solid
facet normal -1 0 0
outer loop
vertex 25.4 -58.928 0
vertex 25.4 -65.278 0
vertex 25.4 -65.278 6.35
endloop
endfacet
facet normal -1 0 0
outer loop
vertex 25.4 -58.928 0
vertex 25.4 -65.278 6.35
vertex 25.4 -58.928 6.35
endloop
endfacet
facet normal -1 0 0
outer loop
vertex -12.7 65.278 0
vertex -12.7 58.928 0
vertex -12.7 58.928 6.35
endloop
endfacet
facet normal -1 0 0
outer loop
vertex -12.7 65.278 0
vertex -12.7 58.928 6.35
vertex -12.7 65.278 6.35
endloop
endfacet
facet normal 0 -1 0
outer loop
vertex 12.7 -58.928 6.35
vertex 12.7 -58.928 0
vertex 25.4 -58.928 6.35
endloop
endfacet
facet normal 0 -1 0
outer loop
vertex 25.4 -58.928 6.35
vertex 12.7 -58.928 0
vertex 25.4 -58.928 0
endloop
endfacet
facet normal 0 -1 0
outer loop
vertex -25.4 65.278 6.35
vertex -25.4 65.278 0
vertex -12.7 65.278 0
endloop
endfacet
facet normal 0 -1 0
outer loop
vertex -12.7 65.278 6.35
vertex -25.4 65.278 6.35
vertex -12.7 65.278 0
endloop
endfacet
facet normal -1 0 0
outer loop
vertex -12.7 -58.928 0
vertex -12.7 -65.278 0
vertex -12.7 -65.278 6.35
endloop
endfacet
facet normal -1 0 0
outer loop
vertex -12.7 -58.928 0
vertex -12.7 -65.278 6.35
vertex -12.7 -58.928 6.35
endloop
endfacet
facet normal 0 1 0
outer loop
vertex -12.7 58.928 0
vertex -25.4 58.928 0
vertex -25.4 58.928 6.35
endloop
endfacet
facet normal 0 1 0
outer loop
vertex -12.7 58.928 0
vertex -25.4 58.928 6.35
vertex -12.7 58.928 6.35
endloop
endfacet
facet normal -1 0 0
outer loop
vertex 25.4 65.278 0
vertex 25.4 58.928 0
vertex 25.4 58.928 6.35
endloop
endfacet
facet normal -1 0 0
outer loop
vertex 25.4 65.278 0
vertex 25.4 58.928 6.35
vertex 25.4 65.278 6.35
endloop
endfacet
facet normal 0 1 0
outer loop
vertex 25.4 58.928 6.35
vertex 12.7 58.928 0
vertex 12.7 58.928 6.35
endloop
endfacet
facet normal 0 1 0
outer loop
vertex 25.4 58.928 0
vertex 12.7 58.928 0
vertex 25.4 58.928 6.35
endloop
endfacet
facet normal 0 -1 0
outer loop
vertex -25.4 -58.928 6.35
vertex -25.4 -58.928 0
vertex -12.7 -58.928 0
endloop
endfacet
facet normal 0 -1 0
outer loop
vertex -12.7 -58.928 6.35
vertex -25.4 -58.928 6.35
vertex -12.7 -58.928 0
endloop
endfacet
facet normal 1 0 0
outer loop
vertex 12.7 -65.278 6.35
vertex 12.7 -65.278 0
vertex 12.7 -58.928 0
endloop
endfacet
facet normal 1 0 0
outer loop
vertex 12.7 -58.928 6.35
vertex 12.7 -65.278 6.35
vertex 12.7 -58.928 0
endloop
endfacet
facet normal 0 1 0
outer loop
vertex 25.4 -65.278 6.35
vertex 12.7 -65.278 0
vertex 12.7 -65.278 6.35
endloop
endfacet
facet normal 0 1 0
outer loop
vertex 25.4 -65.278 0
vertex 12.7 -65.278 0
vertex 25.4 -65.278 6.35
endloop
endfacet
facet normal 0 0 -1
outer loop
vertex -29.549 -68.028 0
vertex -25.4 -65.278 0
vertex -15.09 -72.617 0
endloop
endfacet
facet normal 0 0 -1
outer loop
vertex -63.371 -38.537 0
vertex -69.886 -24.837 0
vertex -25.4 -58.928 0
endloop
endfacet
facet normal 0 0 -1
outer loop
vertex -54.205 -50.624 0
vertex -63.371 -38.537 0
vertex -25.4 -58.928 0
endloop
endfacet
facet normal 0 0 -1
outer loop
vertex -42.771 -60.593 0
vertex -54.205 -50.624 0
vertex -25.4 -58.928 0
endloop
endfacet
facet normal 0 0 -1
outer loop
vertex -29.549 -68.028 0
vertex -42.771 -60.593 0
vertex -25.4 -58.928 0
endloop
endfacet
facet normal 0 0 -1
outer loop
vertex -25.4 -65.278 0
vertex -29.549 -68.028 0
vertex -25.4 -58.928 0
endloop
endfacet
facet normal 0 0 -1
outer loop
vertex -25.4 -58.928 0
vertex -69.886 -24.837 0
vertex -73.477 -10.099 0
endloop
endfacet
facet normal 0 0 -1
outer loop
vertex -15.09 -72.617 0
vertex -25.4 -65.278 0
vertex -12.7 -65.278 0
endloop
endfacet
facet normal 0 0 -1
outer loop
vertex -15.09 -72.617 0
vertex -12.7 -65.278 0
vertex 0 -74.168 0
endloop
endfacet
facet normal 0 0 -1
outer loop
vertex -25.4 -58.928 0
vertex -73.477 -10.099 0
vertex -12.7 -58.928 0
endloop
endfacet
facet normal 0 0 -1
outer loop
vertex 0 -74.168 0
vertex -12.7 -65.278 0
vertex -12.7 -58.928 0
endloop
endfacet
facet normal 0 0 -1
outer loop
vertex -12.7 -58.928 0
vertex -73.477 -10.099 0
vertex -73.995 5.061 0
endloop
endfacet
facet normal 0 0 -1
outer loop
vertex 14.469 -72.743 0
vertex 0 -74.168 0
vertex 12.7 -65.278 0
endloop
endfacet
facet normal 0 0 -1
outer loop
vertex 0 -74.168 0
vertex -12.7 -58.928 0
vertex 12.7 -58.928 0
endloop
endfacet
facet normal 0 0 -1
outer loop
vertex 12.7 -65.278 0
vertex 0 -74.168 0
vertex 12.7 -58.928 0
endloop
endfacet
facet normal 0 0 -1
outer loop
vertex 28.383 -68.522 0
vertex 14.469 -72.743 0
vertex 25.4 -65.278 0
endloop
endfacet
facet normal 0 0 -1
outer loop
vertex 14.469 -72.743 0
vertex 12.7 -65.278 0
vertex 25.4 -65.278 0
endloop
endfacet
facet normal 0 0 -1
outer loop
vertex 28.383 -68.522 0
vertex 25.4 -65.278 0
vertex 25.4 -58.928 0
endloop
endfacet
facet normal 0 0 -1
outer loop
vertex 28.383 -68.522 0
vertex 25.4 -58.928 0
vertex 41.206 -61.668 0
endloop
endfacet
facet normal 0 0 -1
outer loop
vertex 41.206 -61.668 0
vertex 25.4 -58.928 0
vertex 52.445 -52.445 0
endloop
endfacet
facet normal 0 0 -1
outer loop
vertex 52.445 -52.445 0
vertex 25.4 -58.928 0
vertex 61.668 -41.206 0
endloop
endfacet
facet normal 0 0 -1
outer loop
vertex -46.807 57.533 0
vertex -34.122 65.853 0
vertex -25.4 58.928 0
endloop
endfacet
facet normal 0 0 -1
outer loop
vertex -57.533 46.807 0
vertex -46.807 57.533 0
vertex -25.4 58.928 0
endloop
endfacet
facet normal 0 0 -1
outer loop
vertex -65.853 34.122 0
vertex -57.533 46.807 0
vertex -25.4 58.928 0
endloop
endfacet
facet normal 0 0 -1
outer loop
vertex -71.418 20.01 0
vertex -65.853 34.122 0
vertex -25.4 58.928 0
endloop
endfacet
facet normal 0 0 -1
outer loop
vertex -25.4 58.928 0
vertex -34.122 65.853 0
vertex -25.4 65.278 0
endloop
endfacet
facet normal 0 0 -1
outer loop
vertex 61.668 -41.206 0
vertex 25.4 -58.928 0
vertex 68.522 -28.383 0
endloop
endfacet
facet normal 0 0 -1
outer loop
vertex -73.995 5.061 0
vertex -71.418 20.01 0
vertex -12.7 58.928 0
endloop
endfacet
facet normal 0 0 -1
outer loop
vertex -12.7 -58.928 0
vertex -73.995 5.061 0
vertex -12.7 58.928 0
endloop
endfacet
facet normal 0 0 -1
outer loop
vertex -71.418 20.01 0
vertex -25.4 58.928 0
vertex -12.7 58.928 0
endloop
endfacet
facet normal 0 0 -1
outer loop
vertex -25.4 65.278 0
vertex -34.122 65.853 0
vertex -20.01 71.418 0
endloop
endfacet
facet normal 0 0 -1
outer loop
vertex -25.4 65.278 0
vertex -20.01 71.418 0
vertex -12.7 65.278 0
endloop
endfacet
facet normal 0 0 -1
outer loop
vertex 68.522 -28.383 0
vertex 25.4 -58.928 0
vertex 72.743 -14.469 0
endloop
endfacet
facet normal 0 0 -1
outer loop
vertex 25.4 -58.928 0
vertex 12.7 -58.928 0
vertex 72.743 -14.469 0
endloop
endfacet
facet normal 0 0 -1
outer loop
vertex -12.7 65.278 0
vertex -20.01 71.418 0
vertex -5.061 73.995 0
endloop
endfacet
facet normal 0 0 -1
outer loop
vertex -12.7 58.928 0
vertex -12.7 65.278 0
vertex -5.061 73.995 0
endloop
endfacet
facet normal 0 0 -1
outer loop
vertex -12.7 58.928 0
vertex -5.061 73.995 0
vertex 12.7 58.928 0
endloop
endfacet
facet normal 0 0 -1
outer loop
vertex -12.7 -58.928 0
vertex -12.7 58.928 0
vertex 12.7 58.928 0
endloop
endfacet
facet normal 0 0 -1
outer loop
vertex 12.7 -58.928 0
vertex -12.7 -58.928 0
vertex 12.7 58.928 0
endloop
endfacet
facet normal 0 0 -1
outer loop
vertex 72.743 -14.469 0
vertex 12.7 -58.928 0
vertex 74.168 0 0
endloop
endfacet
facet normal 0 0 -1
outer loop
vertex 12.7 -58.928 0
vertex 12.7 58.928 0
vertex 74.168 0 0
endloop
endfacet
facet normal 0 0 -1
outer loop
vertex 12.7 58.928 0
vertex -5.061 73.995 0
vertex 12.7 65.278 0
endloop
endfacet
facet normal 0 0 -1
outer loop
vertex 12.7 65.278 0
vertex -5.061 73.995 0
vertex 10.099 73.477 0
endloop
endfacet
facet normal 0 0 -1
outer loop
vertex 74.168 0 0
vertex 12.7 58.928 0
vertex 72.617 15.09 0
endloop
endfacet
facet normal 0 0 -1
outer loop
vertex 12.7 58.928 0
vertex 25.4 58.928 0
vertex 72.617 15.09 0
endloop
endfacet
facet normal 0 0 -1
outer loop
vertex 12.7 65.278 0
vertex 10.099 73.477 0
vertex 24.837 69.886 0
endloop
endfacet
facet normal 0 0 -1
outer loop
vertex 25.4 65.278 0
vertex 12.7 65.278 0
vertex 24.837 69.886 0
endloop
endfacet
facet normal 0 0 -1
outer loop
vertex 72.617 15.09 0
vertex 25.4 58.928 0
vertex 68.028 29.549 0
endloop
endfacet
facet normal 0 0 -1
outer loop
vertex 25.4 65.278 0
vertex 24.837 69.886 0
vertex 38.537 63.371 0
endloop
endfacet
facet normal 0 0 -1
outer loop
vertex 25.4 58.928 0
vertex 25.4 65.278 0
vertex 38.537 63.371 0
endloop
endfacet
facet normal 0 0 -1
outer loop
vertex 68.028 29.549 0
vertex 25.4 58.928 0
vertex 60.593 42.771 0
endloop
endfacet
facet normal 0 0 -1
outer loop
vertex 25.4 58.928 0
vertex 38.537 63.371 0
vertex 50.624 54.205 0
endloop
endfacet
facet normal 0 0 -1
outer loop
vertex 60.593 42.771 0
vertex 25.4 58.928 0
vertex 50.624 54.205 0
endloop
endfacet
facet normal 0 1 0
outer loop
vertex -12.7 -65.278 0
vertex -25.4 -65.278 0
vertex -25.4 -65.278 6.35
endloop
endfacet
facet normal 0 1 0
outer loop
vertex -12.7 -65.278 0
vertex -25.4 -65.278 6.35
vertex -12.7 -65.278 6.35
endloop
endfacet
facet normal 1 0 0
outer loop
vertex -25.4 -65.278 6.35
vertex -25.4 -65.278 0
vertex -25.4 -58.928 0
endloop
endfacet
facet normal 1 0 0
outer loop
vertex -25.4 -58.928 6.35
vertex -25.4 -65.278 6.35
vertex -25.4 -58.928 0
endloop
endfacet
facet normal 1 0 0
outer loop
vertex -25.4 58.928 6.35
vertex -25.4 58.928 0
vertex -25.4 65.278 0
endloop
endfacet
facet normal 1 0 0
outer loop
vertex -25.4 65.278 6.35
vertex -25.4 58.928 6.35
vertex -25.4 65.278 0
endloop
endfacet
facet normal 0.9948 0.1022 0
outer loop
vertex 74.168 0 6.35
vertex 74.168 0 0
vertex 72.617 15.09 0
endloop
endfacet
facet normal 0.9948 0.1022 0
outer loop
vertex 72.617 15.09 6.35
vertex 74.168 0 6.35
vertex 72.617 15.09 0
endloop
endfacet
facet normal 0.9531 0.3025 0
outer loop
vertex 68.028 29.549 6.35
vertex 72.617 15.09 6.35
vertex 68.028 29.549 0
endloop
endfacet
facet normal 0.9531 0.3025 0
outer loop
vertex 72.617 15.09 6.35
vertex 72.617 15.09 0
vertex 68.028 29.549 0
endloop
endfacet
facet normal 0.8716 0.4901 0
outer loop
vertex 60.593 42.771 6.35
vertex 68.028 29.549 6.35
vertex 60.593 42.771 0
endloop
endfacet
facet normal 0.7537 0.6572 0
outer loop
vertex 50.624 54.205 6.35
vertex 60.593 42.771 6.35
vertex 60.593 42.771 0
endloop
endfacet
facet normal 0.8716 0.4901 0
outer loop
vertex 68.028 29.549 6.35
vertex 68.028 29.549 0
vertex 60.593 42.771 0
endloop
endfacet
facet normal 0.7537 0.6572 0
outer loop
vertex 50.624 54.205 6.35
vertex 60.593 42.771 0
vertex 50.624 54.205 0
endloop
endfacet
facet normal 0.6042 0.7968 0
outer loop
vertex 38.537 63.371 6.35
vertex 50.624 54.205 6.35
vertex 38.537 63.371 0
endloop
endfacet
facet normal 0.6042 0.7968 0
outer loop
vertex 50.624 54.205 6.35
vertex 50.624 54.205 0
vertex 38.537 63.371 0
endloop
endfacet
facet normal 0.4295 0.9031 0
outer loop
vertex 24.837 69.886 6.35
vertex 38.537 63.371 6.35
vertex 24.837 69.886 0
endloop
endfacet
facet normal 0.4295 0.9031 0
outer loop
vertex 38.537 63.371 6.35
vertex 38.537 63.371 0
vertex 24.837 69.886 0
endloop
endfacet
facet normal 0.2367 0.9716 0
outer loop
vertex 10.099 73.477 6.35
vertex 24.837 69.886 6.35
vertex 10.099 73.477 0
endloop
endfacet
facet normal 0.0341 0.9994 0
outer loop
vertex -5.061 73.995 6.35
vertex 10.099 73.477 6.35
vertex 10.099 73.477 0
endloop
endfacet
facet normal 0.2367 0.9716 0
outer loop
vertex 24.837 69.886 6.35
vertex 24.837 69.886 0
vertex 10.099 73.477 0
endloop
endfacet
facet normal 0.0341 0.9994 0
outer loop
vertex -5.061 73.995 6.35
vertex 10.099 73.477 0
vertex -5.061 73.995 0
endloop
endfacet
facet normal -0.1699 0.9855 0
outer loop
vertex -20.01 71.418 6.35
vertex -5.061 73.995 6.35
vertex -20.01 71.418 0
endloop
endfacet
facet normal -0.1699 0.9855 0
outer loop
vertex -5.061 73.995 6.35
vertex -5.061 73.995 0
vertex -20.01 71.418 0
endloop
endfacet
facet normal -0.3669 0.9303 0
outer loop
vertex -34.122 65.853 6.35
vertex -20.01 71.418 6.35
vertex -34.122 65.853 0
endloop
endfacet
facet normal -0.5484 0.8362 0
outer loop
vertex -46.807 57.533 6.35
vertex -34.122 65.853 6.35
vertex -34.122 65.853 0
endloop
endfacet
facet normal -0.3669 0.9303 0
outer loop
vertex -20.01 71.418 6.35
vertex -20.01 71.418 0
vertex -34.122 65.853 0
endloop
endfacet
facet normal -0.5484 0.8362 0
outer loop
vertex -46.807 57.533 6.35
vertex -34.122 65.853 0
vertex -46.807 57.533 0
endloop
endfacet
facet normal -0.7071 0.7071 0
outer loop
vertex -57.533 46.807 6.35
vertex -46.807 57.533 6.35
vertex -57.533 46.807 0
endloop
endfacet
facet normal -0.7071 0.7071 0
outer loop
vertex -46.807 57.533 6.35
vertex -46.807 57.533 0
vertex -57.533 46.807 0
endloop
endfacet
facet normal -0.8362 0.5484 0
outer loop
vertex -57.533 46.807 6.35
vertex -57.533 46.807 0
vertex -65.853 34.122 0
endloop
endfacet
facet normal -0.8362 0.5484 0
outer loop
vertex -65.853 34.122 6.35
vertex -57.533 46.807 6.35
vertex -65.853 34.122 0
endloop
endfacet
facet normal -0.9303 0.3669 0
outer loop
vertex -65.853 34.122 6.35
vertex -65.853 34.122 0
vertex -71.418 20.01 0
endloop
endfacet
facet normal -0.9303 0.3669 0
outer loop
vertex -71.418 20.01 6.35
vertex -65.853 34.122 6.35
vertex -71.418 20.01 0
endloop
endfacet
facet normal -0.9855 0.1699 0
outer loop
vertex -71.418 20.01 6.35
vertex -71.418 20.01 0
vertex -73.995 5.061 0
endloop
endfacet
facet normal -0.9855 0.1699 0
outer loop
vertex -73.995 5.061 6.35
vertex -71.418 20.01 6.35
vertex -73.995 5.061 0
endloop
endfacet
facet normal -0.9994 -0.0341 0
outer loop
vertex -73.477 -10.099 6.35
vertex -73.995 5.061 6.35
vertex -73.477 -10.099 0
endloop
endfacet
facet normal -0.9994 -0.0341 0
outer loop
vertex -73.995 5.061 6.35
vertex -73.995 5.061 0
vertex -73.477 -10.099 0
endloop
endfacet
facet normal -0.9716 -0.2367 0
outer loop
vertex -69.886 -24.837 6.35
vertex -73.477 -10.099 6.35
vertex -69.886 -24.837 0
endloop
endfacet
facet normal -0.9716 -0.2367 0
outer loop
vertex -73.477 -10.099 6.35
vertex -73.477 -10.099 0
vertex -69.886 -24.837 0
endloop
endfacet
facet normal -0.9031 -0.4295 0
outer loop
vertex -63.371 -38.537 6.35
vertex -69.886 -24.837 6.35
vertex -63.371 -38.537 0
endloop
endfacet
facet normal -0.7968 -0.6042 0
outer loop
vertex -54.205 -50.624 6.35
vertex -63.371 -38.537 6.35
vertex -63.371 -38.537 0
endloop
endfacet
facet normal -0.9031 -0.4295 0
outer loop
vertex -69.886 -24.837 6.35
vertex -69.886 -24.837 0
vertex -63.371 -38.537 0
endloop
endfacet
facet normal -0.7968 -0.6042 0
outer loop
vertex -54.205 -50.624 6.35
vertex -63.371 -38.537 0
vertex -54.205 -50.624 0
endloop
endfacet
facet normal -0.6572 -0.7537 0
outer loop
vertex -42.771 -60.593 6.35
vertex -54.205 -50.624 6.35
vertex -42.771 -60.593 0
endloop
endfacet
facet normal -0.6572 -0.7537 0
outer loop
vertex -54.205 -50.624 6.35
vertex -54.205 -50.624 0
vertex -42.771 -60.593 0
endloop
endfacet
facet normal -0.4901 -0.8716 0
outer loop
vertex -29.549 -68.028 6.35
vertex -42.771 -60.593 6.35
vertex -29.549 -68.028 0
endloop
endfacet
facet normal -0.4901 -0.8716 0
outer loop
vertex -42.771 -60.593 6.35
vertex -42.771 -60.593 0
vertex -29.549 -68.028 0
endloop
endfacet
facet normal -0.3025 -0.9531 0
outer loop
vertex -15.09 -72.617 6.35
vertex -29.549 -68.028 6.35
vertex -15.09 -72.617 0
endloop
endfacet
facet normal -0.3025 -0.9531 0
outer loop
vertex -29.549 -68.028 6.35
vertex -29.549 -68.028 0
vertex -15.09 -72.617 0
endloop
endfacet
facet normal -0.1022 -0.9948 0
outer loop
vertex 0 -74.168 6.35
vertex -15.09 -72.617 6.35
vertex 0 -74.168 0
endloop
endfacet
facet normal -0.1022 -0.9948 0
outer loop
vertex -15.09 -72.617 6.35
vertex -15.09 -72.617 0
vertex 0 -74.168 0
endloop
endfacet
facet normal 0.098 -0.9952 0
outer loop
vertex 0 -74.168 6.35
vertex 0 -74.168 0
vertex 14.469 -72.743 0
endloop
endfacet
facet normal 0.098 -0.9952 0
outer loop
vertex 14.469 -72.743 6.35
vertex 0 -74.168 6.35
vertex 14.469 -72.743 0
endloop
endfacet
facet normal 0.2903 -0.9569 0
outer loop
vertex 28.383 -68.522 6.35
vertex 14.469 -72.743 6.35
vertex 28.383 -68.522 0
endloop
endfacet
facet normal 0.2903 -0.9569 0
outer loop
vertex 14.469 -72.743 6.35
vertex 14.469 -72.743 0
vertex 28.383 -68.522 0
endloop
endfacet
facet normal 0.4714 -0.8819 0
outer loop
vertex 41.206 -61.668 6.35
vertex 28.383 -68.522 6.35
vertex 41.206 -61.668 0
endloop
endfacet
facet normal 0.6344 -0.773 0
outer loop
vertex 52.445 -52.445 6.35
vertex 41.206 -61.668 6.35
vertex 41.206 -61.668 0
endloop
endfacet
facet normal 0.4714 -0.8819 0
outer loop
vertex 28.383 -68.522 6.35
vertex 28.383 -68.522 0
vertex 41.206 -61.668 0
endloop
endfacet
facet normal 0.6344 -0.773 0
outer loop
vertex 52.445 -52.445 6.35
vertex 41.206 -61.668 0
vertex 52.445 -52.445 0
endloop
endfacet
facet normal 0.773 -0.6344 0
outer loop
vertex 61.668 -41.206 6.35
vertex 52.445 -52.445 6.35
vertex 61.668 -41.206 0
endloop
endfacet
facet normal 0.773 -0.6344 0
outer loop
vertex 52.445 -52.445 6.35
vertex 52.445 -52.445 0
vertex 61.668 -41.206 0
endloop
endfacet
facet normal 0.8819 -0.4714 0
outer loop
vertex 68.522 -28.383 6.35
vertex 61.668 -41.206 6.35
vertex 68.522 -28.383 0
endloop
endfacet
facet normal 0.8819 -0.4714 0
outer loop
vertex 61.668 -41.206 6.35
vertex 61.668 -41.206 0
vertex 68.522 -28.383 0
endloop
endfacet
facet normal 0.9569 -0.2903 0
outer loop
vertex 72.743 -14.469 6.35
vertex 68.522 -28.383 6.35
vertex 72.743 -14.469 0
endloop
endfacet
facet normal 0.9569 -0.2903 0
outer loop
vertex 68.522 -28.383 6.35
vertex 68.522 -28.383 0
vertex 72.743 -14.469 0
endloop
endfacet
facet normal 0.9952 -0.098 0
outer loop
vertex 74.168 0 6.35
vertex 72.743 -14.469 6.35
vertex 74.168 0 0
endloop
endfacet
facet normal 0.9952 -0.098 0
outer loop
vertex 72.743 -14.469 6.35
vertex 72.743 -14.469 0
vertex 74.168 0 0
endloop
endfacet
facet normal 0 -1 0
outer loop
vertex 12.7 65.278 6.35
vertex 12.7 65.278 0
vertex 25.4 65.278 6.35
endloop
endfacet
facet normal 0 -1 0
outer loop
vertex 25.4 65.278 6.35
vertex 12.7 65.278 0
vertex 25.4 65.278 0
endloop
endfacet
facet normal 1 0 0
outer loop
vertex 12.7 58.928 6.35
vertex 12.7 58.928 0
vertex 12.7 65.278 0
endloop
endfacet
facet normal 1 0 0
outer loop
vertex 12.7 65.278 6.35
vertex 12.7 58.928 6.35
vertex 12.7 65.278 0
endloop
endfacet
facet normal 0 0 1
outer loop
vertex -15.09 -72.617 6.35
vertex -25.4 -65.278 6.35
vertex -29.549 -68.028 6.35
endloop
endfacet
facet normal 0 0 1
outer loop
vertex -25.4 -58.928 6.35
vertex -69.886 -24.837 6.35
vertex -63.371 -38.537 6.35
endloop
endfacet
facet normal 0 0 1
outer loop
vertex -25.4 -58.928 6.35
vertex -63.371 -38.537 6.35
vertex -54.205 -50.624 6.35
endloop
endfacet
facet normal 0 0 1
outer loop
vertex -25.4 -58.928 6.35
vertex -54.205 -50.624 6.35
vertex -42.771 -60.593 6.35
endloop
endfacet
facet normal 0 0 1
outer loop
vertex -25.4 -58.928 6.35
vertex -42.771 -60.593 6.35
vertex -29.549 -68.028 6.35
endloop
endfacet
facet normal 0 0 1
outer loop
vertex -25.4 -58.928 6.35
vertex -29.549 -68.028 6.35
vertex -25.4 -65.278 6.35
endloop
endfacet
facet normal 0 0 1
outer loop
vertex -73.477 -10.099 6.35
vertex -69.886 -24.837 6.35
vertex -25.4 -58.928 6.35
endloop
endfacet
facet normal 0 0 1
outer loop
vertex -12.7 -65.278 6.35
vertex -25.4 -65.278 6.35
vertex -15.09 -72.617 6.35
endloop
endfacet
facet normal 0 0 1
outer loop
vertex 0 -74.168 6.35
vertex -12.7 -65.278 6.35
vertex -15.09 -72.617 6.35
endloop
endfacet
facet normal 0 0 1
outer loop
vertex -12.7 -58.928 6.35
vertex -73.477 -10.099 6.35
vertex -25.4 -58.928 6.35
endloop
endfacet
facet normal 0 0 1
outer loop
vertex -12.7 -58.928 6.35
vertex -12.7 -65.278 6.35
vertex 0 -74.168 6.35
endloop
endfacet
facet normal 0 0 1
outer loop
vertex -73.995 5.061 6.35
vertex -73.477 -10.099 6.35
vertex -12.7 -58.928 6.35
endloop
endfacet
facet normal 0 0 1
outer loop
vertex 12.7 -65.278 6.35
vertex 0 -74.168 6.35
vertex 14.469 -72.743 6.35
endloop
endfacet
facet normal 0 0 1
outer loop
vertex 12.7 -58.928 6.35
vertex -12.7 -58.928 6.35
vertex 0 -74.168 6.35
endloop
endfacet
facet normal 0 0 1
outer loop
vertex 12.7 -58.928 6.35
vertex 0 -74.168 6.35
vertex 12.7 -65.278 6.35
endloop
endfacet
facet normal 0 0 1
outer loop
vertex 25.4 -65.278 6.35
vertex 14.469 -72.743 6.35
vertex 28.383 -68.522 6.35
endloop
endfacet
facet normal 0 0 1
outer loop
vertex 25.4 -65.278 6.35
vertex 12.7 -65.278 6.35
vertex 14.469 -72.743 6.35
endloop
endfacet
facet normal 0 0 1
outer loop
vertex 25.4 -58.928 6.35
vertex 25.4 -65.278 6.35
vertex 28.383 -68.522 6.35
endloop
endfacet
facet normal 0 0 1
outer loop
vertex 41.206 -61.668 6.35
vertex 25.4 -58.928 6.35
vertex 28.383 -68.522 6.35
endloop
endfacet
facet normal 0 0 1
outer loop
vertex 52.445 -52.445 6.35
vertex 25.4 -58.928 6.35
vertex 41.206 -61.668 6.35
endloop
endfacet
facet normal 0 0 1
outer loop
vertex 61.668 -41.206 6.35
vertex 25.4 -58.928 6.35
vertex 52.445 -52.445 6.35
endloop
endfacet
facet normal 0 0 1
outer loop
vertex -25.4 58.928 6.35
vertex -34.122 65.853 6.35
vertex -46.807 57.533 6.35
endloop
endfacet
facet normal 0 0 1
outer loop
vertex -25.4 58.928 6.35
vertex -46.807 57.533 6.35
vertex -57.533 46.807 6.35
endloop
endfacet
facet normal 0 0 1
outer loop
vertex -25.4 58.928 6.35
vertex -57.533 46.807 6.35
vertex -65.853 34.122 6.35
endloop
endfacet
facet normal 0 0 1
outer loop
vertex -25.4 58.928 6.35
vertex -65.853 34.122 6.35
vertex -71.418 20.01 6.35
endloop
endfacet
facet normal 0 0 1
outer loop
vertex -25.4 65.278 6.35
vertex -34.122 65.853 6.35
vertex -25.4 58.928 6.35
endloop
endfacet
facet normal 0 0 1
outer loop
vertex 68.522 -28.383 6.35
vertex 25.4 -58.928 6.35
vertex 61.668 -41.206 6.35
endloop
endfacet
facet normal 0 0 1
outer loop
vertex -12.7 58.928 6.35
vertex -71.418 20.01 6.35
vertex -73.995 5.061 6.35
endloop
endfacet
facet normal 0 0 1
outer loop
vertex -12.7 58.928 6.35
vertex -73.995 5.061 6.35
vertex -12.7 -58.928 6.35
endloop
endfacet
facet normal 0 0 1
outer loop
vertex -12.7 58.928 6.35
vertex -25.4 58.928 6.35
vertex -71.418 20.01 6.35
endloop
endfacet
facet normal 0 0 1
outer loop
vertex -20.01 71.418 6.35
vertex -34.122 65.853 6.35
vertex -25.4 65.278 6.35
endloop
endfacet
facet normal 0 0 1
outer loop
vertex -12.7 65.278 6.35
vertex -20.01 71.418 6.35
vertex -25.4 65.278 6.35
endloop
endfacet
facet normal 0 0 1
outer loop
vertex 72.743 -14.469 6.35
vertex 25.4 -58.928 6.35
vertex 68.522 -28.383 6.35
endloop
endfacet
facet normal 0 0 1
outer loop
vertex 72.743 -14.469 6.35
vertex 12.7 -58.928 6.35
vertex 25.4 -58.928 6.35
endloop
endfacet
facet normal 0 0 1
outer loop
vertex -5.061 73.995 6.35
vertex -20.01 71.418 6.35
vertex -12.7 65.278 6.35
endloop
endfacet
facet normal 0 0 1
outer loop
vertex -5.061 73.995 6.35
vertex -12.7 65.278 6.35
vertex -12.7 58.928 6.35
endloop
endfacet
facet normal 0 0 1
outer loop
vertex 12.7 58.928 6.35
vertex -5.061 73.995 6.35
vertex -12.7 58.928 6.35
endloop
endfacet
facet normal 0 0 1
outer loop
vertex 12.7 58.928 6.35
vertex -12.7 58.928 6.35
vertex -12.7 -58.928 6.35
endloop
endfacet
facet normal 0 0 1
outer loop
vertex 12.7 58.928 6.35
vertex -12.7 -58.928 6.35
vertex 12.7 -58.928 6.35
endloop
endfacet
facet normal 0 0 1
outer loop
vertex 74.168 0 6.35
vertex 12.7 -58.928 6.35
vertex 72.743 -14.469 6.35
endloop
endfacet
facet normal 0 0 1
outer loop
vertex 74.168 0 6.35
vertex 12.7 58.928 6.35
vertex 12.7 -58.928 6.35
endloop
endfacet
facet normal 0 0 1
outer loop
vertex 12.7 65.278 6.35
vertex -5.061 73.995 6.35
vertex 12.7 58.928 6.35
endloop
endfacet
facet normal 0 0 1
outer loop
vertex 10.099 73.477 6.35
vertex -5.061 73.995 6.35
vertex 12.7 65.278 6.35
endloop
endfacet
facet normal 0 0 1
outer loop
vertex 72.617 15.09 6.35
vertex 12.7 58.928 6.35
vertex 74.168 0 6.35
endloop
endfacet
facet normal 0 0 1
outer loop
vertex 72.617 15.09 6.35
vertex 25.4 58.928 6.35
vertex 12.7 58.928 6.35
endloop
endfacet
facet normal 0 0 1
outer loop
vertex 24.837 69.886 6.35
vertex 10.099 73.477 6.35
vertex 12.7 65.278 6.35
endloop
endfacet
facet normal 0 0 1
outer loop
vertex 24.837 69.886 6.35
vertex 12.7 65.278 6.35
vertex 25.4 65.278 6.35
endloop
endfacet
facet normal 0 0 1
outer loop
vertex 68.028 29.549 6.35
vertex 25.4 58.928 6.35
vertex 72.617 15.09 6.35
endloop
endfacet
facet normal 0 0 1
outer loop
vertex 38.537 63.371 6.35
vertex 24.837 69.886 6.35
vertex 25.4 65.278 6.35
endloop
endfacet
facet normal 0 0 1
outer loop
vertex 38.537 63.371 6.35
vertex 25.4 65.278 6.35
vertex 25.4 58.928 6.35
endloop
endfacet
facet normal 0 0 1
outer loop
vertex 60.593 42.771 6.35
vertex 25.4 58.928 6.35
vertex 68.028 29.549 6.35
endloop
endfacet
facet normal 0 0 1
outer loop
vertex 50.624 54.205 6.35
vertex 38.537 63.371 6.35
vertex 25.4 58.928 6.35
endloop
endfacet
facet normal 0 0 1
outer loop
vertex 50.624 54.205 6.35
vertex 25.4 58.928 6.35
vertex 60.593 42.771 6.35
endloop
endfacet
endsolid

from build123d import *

# Parameters (mm, degrees)
F0_W     = 12.7
F0_H     = 6.35
F1_DEPTH = 6.35


with BuildPart() as f1:
    # F0 (on Top) → F1 (new body)
    with BuildSketch(Plane.XY):
        with BuildLine():
            ThreePointArc((0, -74.168), (52.444696, -52.444696), (74.168, 0))
            ThreePointArc((74.168, 0), (-52.444696, 52.444696), (0, -74.168))
        make_face()
        with Locations((-19.05, -62.103)):
            Rectangle(F0_W, F0_H, mode=Mode.SUBTRACT)
        with Locations((19.05, -62.103)):
            Rectangle(F0_W, F0_H, mode=Mode.SUBTRACT)
        with Locations((-19.05, 62.103)):
            Rectangle(F0_W, F0_H, mode=Mode.SUBTRACT)
        with Locations((19.05, 62.103)):
            Rectangle(F0_W, F0_H, mode=Mode.SUBTRACT)
    extrude(amount=F1_DEPTH)


solid = f1.part
